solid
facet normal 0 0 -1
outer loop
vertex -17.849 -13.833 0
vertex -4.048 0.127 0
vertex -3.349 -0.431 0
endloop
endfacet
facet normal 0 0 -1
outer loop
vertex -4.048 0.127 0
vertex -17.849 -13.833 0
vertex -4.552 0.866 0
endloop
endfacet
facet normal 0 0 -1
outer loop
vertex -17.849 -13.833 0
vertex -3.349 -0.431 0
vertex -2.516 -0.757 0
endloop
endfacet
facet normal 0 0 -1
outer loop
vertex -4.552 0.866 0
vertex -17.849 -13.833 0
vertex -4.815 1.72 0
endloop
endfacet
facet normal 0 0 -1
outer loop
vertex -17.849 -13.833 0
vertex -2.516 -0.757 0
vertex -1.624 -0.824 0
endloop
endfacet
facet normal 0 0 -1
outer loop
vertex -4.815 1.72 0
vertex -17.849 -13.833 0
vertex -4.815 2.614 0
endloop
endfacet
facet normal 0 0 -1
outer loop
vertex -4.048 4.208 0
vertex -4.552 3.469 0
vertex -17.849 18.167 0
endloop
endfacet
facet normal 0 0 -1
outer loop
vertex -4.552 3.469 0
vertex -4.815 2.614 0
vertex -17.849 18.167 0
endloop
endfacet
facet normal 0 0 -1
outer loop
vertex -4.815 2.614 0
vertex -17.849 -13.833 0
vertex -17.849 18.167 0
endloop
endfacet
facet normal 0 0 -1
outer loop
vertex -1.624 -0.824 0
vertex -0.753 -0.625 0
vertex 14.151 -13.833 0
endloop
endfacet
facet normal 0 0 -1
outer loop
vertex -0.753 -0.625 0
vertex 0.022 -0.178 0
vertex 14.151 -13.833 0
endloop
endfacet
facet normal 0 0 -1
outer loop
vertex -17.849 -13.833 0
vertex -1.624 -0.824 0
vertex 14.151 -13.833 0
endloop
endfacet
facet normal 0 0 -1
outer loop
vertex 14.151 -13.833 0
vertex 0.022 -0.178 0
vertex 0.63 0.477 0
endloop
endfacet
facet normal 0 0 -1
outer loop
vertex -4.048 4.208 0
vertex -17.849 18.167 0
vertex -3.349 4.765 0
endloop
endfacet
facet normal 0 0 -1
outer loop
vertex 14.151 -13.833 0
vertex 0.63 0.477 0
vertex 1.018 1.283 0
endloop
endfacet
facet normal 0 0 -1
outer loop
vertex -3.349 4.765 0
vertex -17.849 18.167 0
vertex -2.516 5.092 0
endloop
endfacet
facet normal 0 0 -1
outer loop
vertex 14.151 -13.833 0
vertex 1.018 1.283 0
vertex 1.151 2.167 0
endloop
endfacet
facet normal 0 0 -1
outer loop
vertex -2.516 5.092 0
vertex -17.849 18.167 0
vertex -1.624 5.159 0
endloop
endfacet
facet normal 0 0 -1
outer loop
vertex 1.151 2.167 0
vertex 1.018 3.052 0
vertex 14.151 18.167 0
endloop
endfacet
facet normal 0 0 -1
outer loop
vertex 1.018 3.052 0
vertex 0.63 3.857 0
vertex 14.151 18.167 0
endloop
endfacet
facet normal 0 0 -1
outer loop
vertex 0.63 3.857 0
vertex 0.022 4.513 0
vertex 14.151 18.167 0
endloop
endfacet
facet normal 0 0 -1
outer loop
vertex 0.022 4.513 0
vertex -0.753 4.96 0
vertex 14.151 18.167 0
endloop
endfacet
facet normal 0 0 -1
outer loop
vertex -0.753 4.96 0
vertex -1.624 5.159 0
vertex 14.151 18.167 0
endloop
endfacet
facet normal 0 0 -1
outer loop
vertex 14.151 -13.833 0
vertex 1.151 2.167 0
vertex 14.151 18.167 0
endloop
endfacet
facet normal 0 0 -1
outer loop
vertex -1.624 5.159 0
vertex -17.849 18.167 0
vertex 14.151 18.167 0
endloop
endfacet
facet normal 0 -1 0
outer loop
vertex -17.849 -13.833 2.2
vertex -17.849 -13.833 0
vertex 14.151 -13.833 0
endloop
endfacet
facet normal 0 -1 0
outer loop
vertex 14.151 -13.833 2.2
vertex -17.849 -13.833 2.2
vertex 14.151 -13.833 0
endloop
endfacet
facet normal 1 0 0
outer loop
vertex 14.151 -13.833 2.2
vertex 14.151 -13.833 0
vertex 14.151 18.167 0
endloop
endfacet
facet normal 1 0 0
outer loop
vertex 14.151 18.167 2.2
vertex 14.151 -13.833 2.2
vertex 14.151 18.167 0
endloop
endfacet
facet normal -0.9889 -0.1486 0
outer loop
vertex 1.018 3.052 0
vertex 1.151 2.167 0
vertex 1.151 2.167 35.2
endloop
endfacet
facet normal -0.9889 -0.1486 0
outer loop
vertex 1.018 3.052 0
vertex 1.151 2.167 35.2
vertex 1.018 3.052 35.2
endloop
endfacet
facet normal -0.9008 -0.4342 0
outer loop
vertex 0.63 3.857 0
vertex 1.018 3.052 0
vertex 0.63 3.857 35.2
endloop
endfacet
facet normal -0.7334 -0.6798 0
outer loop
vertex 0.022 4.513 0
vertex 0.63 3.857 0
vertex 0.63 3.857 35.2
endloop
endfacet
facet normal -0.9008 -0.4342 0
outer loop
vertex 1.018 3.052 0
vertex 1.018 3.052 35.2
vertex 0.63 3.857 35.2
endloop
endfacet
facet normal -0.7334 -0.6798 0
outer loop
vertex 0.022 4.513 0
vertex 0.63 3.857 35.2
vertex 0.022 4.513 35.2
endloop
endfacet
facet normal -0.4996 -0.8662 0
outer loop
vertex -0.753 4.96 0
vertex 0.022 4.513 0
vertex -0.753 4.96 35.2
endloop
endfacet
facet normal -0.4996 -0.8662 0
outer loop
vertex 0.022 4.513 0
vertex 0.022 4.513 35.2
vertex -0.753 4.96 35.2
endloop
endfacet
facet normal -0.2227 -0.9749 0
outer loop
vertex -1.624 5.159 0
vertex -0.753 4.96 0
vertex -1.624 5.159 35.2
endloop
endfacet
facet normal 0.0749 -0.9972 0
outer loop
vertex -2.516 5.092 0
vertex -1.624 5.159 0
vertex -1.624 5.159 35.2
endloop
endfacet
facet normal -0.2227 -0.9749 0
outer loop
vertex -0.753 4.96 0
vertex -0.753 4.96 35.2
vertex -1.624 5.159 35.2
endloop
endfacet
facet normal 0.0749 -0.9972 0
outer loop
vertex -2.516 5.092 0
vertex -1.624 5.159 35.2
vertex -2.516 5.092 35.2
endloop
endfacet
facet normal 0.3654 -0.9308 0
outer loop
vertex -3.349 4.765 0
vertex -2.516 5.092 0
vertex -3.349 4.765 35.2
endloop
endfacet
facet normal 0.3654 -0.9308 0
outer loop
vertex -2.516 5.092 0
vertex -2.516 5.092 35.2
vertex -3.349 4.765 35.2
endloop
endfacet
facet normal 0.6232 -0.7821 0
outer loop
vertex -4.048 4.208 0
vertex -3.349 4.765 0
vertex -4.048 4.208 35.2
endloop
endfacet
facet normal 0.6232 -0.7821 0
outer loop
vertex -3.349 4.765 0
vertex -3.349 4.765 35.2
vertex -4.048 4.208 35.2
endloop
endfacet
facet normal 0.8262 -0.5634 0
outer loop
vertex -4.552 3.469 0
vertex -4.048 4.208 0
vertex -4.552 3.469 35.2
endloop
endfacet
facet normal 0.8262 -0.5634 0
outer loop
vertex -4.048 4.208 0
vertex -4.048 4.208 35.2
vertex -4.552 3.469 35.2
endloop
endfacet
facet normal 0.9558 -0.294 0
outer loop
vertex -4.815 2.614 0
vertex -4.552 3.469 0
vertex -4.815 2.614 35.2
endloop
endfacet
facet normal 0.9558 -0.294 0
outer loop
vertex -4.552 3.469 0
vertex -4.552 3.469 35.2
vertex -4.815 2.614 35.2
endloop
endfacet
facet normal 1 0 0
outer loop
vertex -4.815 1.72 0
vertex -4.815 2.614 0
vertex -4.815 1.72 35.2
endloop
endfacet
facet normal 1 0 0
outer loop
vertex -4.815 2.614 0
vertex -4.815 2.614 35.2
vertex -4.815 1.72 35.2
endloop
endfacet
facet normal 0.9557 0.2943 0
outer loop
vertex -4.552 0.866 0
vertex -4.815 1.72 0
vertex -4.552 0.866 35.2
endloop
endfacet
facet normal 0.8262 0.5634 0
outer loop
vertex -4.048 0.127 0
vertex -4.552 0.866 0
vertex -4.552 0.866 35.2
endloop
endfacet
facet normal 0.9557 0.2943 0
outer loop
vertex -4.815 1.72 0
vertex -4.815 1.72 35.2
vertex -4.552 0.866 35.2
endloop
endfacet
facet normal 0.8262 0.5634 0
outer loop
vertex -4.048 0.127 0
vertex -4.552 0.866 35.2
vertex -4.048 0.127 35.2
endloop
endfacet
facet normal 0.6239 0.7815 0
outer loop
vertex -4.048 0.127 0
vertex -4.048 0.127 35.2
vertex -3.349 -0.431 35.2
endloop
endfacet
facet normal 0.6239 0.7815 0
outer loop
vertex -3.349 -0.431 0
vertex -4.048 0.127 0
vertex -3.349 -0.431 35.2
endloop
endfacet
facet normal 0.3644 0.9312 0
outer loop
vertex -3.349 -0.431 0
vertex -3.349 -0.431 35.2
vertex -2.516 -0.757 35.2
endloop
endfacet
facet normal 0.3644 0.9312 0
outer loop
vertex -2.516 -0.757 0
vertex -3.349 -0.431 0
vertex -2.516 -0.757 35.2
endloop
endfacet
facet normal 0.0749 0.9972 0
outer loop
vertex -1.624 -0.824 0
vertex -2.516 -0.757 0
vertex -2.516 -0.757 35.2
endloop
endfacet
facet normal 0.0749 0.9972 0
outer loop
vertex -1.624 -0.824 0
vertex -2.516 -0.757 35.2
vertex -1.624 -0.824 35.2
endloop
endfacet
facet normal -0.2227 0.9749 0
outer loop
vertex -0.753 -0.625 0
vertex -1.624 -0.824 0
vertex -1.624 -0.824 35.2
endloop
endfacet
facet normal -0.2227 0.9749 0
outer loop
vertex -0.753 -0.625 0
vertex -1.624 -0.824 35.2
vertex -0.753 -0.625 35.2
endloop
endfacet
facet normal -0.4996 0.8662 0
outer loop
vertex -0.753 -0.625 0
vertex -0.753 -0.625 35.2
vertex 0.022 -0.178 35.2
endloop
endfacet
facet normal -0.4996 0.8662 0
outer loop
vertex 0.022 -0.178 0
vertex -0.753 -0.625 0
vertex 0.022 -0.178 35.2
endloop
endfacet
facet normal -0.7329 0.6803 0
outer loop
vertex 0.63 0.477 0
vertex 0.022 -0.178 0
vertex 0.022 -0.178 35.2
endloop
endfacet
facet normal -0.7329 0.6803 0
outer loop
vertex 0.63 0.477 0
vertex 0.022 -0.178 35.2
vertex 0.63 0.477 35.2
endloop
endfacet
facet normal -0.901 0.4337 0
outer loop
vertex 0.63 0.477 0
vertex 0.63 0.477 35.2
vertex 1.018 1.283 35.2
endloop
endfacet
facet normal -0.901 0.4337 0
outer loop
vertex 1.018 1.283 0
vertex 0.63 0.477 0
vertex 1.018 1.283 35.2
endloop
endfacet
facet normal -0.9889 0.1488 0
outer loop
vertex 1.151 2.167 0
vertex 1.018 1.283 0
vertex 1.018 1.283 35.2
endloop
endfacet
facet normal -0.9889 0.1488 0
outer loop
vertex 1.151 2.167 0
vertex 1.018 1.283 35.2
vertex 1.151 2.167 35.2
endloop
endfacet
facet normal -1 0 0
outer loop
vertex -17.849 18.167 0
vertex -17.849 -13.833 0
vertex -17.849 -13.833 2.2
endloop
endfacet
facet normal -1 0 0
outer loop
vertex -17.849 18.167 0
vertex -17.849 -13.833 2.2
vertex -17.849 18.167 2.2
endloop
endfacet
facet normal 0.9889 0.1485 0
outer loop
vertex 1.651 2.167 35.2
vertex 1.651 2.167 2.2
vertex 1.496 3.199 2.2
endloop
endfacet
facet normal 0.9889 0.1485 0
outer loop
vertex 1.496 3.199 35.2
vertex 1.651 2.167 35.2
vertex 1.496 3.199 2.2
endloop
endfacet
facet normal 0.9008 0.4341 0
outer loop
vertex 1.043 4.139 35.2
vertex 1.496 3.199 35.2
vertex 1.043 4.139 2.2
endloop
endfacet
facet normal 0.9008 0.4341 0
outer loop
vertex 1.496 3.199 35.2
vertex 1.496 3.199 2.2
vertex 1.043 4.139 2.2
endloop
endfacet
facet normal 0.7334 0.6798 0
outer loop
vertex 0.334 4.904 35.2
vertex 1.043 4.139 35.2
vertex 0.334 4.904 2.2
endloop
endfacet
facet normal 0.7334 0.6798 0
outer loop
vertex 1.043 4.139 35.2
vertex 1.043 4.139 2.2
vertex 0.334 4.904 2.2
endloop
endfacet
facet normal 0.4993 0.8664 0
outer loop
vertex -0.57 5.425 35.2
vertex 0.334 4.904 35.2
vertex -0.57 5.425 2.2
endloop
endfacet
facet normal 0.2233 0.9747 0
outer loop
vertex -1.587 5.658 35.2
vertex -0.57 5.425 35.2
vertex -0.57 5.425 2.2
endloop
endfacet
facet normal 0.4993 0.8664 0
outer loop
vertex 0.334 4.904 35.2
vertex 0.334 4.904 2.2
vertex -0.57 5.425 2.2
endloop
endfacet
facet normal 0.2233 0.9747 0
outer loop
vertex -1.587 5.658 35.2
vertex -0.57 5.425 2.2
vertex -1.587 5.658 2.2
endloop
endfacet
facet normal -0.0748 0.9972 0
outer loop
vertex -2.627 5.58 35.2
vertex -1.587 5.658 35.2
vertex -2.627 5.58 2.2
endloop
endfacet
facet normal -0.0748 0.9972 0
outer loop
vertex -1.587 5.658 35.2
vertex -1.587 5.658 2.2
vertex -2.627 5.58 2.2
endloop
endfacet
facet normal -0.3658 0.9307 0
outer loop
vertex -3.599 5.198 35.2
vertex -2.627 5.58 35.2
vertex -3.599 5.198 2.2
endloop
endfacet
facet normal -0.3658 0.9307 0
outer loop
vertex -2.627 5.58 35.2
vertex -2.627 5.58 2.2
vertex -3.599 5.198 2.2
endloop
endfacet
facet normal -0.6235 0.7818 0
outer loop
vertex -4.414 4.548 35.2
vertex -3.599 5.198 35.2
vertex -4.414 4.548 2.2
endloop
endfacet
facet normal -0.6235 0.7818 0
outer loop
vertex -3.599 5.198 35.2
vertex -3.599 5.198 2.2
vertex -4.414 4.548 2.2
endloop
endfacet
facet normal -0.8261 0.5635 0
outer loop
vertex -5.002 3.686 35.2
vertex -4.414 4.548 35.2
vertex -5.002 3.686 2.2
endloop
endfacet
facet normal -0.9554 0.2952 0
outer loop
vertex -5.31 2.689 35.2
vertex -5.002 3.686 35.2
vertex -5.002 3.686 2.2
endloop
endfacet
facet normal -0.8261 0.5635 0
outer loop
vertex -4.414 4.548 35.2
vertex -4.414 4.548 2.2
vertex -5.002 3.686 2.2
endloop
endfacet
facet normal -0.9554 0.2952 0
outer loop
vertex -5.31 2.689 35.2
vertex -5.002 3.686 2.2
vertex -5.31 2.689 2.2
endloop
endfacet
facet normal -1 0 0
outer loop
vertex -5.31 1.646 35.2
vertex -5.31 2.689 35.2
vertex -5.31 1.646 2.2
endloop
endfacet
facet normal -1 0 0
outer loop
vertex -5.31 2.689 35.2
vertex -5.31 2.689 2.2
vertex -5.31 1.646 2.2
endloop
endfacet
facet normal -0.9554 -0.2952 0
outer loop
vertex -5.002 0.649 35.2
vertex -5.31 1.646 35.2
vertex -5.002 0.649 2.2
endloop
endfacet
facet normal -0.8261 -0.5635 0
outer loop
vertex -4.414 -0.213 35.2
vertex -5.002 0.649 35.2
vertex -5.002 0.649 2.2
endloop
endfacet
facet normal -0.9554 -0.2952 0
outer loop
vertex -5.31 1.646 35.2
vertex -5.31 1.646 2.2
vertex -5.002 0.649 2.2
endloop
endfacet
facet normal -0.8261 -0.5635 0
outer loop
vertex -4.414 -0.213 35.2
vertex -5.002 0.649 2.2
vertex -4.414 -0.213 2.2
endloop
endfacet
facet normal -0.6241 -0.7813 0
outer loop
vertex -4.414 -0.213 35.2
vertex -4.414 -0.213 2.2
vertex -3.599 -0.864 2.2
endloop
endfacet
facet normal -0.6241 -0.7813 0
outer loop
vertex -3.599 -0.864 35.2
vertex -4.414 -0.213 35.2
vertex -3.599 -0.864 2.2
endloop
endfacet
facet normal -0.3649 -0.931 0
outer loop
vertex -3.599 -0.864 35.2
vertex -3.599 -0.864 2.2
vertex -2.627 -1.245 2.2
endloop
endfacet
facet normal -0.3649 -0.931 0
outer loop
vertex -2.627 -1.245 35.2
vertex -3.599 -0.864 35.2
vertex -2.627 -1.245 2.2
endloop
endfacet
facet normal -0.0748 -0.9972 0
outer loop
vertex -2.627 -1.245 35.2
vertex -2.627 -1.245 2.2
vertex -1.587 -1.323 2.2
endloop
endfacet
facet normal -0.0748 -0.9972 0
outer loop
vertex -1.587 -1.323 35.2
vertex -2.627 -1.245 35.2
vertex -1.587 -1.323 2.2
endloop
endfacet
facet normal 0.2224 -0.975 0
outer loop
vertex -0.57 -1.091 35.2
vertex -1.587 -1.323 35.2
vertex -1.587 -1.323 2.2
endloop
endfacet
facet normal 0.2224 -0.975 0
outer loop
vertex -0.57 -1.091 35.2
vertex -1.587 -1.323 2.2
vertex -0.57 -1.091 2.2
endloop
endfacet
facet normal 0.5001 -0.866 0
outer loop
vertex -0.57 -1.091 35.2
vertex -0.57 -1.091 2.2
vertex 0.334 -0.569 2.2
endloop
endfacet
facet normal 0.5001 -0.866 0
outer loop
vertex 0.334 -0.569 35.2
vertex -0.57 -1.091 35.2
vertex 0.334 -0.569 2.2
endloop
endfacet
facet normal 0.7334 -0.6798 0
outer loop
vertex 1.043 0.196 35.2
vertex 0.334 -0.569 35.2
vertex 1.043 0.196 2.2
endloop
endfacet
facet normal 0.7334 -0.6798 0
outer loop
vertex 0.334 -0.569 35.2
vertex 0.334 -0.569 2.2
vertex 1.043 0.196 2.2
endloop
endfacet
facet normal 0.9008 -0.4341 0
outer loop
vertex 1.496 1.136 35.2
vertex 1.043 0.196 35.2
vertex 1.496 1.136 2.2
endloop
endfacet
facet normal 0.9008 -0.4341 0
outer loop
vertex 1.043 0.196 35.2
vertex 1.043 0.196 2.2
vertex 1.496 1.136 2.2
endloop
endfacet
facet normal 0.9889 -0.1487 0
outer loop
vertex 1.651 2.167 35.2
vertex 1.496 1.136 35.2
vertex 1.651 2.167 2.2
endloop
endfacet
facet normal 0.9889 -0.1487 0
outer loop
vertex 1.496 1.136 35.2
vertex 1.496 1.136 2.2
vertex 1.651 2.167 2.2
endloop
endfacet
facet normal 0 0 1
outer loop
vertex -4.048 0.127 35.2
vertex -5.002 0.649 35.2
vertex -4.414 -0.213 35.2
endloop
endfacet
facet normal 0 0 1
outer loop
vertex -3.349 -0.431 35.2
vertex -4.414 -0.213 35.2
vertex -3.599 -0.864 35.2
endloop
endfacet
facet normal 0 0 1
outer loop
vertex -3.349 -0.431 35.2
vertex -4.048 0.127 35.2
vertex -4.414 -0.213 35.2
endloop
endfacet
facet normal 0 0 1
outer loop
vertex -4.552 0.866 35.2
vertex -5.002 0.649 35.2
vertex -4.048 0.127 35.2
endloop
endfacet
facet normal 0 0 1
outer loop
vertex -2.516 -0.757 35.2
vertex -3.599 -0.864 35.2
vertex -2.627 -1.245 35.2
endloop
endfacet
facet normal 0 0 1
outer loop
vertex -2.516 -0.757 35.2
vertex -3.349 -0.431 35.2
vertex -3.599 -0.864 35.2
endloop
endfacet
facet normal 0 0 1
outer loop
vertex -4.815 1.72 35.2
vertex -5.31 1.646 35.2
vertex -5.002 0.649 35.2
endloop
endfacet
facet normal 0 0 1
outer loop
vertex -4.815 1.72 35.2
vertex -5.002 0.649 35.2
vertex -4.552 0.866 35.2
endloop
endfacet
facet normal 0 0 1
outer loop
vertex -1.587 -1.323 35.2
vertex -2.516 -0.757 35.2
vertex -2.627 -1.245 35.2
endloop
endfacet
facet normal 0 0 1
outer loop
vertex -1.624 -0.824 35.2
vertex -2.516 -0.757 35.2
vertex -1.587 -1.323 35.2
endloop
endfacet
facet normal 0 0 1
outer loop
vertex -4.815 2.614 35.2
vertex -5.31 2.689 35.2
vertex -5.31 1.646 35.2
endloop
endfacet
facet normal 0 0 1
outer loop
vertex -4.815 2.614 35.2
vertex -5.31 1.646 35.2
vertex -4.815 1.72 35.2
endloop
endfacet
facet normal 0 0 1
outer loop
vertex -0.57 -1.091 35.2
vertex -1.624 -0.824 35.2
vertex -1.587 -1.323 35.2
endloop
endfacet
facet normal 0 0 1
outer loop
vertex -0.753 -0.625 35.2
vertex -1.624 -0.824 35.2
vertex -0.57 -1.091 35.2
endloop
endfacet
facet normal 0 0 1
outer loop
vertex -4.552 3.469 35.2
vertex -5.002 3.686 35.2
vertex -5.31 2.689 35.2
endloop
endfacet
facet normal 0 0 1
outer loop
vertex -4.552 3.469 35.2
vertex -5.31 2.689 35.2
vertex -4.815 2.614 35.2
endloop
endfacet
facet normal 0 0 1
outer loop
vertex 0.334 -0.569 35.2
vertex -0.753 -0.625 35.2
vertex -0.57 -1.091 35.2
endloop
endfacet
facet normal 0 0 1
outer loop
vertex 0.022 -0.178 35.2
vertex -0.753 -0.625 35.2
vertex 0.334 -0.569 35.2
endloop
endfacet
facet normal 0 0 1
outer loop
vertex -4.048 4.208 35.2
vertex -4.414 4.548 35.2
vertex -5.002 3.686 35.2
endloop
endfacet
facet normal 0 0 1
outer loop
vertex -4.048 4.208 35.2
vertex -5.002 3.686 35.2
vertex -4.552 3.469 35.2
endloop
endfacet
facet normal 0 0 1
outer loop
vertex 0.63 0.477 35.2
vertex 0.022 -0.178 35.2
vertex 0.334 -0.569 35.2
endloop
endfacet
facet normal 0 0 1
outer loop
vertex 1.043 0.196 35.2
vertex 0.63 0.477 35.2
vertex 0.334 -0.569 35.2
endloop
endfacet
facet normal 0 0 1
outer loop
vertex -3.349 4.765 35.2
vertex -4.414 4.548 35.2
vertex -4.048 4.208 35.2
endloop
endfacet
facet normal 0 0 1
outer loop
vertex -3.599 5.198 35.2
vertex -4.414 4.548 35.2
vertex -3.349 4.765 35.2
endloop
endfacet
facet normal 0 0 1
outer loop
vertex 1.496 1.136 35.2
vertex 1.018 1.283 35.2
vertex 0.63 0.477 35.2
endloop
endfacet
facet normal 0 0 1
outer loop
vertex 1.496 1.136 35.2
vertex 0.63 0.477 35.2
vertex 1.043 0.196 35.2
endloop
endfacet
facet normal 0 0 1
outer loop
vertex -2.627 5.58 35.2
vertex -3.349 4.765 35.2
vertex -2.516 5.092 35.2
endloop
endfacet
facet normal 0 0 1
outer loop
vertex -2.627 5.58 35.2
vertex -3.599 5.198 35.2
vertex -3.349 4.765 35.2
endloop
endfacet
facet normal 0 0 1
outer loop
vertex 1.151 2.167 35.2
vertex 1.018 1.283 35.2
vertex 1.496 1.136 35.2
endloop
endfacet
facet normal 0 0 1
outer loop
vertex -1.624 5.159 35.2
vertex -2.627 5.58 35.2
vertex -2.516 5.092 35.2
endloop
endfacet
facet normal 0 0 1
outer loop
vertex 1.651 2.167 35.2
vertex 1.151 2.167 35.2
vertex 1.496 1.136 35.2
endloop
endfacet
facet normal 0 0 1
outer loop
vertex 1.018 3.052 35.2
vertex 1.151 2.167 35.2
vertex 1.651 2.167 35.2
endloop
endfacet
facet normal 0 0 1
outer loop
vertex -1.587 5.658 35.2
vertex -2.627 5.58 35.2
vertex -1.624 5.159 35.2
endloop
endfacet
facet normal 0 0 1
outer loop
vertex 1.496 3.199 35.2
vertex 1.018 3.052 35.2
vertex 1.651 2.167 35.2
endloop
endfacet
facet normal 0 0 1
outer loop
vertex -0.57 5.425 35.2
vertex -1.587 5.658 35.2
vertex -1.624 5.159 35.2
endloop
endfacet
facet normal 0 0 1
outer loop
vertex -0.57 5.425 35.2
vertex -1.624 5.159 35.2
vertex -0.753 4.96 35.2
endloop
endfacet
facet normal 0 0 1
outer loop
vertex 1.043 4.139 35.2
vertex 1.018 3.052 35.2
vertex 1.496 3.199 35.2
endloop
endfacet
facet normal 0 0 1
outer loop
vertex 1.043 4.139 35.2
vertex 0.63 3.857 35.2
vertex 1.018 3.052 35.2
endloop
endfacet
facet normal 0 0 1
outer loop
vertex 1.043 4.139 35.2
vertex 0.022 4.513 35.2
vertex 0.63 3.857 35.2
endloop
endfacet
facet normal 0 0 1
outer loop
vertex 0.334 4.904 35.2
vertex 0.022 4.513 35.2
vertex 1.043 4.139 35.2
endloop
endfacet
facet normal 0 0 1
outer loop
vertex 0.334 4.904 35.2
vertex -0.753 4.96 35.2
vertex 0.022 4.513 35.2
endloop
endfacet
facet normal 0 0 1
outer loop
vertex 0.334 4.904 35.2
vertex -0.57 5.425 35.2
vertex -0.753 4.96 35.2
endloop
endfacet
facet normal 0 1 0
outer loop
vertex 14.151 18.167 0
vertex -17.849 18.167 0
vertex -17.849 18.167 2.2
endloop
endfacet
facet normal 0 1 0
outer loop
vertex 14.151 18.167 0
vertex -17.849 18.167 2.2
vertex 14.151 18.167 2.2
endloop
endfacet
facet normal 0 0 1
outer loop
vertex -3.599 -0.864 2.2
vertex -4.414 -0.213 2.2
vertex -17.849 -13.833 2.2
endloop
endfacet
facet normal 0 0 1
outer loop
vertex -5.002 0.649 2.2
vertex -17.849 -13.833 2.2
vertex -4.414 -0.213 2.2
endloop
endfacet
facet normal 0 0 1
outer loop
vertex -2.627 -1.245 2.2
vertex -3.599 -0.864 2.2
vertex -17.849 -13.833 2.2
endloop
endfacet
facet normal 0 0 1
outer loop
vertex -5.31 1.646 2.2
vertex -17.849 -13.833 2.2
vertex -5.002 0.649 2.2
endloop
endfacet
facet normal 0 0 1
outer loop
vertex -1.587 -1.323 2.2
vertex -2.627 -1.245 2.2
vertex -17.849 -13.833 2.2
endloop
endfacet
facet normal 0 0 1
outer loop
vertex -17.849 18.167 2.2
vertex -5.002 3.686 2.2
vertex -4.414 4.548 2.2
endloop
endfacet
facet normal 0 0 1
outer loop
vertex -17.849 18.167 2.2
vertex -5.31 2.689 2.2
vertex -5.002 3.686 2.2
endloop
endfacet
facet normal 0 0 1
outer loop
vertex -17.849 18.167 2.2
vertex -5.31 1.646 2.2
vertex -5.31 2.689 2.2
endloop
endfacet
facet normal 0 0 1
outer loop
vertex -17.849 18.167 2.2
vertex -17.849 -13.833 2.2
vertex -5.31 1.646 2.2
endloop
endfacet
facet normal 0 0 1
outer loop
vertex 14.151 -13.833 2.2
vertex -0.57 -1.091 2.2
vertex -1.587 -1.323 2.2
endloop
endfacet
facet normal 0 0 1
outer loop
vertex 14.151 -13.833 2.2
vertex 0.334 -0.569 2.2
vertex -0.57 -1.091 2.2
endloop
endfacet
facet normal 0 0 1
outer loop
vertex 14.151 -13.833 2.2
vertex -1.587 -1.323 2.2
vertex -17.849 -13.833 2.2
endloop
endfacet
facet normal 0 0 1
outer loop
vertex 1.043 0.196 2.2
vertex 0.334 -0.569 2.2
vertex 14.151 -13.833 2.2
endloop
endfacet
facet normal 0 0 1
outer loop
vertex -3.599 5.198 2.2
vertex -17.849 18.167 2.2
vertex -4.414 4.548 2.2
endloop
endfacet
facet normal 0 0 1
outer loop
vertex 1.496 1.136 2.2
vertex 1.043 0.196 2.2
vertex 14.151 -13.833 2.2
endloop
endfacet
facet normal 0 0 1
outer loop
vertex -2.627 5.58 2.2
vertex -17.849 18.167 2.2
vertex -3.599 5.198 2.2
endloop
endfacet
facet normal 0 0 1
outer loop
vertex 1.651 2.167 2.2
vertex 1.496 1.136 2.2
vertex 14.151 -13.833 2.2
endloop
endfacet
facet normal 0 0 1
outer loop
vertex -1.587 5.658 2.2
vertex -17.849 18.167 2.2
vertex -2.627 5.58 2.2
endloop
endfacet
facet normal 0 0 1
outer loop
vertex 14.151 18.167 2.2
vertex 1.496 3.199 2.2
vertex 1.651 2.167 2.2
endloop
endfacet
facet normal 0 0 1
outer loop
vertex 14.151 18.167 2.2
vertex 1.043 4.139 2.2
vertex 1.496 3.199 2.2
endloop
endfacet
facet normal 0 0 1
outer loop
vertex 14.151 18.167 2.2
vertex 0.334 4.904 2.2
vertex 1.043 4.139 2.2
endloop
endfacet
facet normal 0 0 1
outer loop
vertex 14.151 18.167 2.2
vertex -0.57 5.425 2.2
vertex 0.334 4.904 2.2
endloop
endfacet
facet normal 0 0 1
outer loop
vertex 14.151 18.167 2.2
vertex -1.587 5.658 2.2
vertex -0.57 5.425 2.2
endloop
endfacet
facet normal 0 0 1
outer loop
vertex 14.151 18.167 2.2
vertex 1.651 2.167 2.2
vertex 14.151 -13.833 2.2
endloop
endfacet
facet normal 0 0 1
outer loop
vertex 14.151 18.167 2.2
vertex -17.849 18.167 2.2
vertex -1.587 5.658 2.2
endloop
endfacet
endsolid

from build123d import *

# Parameters (mm, degrees)
ESQUISSE1_W             = 32
ESQUISSE1_H             = 32
BOSS_EXTRU_1_DEPTH      = 2.2
ESQUISSE2_R             = 3.5
BOSS_EXTRU_2_DEPTH      = 33
ESQUISSE3_R             = 3
ENL_V_MAT_EXTRU_1_DEPTH = 44.447262572


with BuildPart() as part:
    # Esquisse1 → Boss.-Extru.1 (new body)
    with BuildSketch(Plane.XY):
        with Locations((-1.848605578, 2.167330677)):
            Rectangle(ESQUISSE1_W, ESQUISSE1_H)
    extrude(amount=BOSS_EXTRU_1_DEPTH)

    # Esquisse2 → Boss.-Extru.2 (add)
    with BuildSketch(Plane.XY.offset(2.2)):
        with Locations((-1.848605578, 2.167330677)):
            Circle(ESQUISSE2_R)
    extrude(amount=BOSS_EXTRU_2_DEPTH)

    # Esquisse3 → Enlèv. mat.-Extru.1 (cut, through all)
    with BuildSketch(Plane.XY.offset(35.2)):
        with Locations((-1.848605578, 2.167330677)):
            Circle(ESQUISSE3_R)
    extrude(amount=-ENL_V_MAT_EXTRU_1_DEPTH, mode=Mode.SUBTRACT)


solid = part.part
